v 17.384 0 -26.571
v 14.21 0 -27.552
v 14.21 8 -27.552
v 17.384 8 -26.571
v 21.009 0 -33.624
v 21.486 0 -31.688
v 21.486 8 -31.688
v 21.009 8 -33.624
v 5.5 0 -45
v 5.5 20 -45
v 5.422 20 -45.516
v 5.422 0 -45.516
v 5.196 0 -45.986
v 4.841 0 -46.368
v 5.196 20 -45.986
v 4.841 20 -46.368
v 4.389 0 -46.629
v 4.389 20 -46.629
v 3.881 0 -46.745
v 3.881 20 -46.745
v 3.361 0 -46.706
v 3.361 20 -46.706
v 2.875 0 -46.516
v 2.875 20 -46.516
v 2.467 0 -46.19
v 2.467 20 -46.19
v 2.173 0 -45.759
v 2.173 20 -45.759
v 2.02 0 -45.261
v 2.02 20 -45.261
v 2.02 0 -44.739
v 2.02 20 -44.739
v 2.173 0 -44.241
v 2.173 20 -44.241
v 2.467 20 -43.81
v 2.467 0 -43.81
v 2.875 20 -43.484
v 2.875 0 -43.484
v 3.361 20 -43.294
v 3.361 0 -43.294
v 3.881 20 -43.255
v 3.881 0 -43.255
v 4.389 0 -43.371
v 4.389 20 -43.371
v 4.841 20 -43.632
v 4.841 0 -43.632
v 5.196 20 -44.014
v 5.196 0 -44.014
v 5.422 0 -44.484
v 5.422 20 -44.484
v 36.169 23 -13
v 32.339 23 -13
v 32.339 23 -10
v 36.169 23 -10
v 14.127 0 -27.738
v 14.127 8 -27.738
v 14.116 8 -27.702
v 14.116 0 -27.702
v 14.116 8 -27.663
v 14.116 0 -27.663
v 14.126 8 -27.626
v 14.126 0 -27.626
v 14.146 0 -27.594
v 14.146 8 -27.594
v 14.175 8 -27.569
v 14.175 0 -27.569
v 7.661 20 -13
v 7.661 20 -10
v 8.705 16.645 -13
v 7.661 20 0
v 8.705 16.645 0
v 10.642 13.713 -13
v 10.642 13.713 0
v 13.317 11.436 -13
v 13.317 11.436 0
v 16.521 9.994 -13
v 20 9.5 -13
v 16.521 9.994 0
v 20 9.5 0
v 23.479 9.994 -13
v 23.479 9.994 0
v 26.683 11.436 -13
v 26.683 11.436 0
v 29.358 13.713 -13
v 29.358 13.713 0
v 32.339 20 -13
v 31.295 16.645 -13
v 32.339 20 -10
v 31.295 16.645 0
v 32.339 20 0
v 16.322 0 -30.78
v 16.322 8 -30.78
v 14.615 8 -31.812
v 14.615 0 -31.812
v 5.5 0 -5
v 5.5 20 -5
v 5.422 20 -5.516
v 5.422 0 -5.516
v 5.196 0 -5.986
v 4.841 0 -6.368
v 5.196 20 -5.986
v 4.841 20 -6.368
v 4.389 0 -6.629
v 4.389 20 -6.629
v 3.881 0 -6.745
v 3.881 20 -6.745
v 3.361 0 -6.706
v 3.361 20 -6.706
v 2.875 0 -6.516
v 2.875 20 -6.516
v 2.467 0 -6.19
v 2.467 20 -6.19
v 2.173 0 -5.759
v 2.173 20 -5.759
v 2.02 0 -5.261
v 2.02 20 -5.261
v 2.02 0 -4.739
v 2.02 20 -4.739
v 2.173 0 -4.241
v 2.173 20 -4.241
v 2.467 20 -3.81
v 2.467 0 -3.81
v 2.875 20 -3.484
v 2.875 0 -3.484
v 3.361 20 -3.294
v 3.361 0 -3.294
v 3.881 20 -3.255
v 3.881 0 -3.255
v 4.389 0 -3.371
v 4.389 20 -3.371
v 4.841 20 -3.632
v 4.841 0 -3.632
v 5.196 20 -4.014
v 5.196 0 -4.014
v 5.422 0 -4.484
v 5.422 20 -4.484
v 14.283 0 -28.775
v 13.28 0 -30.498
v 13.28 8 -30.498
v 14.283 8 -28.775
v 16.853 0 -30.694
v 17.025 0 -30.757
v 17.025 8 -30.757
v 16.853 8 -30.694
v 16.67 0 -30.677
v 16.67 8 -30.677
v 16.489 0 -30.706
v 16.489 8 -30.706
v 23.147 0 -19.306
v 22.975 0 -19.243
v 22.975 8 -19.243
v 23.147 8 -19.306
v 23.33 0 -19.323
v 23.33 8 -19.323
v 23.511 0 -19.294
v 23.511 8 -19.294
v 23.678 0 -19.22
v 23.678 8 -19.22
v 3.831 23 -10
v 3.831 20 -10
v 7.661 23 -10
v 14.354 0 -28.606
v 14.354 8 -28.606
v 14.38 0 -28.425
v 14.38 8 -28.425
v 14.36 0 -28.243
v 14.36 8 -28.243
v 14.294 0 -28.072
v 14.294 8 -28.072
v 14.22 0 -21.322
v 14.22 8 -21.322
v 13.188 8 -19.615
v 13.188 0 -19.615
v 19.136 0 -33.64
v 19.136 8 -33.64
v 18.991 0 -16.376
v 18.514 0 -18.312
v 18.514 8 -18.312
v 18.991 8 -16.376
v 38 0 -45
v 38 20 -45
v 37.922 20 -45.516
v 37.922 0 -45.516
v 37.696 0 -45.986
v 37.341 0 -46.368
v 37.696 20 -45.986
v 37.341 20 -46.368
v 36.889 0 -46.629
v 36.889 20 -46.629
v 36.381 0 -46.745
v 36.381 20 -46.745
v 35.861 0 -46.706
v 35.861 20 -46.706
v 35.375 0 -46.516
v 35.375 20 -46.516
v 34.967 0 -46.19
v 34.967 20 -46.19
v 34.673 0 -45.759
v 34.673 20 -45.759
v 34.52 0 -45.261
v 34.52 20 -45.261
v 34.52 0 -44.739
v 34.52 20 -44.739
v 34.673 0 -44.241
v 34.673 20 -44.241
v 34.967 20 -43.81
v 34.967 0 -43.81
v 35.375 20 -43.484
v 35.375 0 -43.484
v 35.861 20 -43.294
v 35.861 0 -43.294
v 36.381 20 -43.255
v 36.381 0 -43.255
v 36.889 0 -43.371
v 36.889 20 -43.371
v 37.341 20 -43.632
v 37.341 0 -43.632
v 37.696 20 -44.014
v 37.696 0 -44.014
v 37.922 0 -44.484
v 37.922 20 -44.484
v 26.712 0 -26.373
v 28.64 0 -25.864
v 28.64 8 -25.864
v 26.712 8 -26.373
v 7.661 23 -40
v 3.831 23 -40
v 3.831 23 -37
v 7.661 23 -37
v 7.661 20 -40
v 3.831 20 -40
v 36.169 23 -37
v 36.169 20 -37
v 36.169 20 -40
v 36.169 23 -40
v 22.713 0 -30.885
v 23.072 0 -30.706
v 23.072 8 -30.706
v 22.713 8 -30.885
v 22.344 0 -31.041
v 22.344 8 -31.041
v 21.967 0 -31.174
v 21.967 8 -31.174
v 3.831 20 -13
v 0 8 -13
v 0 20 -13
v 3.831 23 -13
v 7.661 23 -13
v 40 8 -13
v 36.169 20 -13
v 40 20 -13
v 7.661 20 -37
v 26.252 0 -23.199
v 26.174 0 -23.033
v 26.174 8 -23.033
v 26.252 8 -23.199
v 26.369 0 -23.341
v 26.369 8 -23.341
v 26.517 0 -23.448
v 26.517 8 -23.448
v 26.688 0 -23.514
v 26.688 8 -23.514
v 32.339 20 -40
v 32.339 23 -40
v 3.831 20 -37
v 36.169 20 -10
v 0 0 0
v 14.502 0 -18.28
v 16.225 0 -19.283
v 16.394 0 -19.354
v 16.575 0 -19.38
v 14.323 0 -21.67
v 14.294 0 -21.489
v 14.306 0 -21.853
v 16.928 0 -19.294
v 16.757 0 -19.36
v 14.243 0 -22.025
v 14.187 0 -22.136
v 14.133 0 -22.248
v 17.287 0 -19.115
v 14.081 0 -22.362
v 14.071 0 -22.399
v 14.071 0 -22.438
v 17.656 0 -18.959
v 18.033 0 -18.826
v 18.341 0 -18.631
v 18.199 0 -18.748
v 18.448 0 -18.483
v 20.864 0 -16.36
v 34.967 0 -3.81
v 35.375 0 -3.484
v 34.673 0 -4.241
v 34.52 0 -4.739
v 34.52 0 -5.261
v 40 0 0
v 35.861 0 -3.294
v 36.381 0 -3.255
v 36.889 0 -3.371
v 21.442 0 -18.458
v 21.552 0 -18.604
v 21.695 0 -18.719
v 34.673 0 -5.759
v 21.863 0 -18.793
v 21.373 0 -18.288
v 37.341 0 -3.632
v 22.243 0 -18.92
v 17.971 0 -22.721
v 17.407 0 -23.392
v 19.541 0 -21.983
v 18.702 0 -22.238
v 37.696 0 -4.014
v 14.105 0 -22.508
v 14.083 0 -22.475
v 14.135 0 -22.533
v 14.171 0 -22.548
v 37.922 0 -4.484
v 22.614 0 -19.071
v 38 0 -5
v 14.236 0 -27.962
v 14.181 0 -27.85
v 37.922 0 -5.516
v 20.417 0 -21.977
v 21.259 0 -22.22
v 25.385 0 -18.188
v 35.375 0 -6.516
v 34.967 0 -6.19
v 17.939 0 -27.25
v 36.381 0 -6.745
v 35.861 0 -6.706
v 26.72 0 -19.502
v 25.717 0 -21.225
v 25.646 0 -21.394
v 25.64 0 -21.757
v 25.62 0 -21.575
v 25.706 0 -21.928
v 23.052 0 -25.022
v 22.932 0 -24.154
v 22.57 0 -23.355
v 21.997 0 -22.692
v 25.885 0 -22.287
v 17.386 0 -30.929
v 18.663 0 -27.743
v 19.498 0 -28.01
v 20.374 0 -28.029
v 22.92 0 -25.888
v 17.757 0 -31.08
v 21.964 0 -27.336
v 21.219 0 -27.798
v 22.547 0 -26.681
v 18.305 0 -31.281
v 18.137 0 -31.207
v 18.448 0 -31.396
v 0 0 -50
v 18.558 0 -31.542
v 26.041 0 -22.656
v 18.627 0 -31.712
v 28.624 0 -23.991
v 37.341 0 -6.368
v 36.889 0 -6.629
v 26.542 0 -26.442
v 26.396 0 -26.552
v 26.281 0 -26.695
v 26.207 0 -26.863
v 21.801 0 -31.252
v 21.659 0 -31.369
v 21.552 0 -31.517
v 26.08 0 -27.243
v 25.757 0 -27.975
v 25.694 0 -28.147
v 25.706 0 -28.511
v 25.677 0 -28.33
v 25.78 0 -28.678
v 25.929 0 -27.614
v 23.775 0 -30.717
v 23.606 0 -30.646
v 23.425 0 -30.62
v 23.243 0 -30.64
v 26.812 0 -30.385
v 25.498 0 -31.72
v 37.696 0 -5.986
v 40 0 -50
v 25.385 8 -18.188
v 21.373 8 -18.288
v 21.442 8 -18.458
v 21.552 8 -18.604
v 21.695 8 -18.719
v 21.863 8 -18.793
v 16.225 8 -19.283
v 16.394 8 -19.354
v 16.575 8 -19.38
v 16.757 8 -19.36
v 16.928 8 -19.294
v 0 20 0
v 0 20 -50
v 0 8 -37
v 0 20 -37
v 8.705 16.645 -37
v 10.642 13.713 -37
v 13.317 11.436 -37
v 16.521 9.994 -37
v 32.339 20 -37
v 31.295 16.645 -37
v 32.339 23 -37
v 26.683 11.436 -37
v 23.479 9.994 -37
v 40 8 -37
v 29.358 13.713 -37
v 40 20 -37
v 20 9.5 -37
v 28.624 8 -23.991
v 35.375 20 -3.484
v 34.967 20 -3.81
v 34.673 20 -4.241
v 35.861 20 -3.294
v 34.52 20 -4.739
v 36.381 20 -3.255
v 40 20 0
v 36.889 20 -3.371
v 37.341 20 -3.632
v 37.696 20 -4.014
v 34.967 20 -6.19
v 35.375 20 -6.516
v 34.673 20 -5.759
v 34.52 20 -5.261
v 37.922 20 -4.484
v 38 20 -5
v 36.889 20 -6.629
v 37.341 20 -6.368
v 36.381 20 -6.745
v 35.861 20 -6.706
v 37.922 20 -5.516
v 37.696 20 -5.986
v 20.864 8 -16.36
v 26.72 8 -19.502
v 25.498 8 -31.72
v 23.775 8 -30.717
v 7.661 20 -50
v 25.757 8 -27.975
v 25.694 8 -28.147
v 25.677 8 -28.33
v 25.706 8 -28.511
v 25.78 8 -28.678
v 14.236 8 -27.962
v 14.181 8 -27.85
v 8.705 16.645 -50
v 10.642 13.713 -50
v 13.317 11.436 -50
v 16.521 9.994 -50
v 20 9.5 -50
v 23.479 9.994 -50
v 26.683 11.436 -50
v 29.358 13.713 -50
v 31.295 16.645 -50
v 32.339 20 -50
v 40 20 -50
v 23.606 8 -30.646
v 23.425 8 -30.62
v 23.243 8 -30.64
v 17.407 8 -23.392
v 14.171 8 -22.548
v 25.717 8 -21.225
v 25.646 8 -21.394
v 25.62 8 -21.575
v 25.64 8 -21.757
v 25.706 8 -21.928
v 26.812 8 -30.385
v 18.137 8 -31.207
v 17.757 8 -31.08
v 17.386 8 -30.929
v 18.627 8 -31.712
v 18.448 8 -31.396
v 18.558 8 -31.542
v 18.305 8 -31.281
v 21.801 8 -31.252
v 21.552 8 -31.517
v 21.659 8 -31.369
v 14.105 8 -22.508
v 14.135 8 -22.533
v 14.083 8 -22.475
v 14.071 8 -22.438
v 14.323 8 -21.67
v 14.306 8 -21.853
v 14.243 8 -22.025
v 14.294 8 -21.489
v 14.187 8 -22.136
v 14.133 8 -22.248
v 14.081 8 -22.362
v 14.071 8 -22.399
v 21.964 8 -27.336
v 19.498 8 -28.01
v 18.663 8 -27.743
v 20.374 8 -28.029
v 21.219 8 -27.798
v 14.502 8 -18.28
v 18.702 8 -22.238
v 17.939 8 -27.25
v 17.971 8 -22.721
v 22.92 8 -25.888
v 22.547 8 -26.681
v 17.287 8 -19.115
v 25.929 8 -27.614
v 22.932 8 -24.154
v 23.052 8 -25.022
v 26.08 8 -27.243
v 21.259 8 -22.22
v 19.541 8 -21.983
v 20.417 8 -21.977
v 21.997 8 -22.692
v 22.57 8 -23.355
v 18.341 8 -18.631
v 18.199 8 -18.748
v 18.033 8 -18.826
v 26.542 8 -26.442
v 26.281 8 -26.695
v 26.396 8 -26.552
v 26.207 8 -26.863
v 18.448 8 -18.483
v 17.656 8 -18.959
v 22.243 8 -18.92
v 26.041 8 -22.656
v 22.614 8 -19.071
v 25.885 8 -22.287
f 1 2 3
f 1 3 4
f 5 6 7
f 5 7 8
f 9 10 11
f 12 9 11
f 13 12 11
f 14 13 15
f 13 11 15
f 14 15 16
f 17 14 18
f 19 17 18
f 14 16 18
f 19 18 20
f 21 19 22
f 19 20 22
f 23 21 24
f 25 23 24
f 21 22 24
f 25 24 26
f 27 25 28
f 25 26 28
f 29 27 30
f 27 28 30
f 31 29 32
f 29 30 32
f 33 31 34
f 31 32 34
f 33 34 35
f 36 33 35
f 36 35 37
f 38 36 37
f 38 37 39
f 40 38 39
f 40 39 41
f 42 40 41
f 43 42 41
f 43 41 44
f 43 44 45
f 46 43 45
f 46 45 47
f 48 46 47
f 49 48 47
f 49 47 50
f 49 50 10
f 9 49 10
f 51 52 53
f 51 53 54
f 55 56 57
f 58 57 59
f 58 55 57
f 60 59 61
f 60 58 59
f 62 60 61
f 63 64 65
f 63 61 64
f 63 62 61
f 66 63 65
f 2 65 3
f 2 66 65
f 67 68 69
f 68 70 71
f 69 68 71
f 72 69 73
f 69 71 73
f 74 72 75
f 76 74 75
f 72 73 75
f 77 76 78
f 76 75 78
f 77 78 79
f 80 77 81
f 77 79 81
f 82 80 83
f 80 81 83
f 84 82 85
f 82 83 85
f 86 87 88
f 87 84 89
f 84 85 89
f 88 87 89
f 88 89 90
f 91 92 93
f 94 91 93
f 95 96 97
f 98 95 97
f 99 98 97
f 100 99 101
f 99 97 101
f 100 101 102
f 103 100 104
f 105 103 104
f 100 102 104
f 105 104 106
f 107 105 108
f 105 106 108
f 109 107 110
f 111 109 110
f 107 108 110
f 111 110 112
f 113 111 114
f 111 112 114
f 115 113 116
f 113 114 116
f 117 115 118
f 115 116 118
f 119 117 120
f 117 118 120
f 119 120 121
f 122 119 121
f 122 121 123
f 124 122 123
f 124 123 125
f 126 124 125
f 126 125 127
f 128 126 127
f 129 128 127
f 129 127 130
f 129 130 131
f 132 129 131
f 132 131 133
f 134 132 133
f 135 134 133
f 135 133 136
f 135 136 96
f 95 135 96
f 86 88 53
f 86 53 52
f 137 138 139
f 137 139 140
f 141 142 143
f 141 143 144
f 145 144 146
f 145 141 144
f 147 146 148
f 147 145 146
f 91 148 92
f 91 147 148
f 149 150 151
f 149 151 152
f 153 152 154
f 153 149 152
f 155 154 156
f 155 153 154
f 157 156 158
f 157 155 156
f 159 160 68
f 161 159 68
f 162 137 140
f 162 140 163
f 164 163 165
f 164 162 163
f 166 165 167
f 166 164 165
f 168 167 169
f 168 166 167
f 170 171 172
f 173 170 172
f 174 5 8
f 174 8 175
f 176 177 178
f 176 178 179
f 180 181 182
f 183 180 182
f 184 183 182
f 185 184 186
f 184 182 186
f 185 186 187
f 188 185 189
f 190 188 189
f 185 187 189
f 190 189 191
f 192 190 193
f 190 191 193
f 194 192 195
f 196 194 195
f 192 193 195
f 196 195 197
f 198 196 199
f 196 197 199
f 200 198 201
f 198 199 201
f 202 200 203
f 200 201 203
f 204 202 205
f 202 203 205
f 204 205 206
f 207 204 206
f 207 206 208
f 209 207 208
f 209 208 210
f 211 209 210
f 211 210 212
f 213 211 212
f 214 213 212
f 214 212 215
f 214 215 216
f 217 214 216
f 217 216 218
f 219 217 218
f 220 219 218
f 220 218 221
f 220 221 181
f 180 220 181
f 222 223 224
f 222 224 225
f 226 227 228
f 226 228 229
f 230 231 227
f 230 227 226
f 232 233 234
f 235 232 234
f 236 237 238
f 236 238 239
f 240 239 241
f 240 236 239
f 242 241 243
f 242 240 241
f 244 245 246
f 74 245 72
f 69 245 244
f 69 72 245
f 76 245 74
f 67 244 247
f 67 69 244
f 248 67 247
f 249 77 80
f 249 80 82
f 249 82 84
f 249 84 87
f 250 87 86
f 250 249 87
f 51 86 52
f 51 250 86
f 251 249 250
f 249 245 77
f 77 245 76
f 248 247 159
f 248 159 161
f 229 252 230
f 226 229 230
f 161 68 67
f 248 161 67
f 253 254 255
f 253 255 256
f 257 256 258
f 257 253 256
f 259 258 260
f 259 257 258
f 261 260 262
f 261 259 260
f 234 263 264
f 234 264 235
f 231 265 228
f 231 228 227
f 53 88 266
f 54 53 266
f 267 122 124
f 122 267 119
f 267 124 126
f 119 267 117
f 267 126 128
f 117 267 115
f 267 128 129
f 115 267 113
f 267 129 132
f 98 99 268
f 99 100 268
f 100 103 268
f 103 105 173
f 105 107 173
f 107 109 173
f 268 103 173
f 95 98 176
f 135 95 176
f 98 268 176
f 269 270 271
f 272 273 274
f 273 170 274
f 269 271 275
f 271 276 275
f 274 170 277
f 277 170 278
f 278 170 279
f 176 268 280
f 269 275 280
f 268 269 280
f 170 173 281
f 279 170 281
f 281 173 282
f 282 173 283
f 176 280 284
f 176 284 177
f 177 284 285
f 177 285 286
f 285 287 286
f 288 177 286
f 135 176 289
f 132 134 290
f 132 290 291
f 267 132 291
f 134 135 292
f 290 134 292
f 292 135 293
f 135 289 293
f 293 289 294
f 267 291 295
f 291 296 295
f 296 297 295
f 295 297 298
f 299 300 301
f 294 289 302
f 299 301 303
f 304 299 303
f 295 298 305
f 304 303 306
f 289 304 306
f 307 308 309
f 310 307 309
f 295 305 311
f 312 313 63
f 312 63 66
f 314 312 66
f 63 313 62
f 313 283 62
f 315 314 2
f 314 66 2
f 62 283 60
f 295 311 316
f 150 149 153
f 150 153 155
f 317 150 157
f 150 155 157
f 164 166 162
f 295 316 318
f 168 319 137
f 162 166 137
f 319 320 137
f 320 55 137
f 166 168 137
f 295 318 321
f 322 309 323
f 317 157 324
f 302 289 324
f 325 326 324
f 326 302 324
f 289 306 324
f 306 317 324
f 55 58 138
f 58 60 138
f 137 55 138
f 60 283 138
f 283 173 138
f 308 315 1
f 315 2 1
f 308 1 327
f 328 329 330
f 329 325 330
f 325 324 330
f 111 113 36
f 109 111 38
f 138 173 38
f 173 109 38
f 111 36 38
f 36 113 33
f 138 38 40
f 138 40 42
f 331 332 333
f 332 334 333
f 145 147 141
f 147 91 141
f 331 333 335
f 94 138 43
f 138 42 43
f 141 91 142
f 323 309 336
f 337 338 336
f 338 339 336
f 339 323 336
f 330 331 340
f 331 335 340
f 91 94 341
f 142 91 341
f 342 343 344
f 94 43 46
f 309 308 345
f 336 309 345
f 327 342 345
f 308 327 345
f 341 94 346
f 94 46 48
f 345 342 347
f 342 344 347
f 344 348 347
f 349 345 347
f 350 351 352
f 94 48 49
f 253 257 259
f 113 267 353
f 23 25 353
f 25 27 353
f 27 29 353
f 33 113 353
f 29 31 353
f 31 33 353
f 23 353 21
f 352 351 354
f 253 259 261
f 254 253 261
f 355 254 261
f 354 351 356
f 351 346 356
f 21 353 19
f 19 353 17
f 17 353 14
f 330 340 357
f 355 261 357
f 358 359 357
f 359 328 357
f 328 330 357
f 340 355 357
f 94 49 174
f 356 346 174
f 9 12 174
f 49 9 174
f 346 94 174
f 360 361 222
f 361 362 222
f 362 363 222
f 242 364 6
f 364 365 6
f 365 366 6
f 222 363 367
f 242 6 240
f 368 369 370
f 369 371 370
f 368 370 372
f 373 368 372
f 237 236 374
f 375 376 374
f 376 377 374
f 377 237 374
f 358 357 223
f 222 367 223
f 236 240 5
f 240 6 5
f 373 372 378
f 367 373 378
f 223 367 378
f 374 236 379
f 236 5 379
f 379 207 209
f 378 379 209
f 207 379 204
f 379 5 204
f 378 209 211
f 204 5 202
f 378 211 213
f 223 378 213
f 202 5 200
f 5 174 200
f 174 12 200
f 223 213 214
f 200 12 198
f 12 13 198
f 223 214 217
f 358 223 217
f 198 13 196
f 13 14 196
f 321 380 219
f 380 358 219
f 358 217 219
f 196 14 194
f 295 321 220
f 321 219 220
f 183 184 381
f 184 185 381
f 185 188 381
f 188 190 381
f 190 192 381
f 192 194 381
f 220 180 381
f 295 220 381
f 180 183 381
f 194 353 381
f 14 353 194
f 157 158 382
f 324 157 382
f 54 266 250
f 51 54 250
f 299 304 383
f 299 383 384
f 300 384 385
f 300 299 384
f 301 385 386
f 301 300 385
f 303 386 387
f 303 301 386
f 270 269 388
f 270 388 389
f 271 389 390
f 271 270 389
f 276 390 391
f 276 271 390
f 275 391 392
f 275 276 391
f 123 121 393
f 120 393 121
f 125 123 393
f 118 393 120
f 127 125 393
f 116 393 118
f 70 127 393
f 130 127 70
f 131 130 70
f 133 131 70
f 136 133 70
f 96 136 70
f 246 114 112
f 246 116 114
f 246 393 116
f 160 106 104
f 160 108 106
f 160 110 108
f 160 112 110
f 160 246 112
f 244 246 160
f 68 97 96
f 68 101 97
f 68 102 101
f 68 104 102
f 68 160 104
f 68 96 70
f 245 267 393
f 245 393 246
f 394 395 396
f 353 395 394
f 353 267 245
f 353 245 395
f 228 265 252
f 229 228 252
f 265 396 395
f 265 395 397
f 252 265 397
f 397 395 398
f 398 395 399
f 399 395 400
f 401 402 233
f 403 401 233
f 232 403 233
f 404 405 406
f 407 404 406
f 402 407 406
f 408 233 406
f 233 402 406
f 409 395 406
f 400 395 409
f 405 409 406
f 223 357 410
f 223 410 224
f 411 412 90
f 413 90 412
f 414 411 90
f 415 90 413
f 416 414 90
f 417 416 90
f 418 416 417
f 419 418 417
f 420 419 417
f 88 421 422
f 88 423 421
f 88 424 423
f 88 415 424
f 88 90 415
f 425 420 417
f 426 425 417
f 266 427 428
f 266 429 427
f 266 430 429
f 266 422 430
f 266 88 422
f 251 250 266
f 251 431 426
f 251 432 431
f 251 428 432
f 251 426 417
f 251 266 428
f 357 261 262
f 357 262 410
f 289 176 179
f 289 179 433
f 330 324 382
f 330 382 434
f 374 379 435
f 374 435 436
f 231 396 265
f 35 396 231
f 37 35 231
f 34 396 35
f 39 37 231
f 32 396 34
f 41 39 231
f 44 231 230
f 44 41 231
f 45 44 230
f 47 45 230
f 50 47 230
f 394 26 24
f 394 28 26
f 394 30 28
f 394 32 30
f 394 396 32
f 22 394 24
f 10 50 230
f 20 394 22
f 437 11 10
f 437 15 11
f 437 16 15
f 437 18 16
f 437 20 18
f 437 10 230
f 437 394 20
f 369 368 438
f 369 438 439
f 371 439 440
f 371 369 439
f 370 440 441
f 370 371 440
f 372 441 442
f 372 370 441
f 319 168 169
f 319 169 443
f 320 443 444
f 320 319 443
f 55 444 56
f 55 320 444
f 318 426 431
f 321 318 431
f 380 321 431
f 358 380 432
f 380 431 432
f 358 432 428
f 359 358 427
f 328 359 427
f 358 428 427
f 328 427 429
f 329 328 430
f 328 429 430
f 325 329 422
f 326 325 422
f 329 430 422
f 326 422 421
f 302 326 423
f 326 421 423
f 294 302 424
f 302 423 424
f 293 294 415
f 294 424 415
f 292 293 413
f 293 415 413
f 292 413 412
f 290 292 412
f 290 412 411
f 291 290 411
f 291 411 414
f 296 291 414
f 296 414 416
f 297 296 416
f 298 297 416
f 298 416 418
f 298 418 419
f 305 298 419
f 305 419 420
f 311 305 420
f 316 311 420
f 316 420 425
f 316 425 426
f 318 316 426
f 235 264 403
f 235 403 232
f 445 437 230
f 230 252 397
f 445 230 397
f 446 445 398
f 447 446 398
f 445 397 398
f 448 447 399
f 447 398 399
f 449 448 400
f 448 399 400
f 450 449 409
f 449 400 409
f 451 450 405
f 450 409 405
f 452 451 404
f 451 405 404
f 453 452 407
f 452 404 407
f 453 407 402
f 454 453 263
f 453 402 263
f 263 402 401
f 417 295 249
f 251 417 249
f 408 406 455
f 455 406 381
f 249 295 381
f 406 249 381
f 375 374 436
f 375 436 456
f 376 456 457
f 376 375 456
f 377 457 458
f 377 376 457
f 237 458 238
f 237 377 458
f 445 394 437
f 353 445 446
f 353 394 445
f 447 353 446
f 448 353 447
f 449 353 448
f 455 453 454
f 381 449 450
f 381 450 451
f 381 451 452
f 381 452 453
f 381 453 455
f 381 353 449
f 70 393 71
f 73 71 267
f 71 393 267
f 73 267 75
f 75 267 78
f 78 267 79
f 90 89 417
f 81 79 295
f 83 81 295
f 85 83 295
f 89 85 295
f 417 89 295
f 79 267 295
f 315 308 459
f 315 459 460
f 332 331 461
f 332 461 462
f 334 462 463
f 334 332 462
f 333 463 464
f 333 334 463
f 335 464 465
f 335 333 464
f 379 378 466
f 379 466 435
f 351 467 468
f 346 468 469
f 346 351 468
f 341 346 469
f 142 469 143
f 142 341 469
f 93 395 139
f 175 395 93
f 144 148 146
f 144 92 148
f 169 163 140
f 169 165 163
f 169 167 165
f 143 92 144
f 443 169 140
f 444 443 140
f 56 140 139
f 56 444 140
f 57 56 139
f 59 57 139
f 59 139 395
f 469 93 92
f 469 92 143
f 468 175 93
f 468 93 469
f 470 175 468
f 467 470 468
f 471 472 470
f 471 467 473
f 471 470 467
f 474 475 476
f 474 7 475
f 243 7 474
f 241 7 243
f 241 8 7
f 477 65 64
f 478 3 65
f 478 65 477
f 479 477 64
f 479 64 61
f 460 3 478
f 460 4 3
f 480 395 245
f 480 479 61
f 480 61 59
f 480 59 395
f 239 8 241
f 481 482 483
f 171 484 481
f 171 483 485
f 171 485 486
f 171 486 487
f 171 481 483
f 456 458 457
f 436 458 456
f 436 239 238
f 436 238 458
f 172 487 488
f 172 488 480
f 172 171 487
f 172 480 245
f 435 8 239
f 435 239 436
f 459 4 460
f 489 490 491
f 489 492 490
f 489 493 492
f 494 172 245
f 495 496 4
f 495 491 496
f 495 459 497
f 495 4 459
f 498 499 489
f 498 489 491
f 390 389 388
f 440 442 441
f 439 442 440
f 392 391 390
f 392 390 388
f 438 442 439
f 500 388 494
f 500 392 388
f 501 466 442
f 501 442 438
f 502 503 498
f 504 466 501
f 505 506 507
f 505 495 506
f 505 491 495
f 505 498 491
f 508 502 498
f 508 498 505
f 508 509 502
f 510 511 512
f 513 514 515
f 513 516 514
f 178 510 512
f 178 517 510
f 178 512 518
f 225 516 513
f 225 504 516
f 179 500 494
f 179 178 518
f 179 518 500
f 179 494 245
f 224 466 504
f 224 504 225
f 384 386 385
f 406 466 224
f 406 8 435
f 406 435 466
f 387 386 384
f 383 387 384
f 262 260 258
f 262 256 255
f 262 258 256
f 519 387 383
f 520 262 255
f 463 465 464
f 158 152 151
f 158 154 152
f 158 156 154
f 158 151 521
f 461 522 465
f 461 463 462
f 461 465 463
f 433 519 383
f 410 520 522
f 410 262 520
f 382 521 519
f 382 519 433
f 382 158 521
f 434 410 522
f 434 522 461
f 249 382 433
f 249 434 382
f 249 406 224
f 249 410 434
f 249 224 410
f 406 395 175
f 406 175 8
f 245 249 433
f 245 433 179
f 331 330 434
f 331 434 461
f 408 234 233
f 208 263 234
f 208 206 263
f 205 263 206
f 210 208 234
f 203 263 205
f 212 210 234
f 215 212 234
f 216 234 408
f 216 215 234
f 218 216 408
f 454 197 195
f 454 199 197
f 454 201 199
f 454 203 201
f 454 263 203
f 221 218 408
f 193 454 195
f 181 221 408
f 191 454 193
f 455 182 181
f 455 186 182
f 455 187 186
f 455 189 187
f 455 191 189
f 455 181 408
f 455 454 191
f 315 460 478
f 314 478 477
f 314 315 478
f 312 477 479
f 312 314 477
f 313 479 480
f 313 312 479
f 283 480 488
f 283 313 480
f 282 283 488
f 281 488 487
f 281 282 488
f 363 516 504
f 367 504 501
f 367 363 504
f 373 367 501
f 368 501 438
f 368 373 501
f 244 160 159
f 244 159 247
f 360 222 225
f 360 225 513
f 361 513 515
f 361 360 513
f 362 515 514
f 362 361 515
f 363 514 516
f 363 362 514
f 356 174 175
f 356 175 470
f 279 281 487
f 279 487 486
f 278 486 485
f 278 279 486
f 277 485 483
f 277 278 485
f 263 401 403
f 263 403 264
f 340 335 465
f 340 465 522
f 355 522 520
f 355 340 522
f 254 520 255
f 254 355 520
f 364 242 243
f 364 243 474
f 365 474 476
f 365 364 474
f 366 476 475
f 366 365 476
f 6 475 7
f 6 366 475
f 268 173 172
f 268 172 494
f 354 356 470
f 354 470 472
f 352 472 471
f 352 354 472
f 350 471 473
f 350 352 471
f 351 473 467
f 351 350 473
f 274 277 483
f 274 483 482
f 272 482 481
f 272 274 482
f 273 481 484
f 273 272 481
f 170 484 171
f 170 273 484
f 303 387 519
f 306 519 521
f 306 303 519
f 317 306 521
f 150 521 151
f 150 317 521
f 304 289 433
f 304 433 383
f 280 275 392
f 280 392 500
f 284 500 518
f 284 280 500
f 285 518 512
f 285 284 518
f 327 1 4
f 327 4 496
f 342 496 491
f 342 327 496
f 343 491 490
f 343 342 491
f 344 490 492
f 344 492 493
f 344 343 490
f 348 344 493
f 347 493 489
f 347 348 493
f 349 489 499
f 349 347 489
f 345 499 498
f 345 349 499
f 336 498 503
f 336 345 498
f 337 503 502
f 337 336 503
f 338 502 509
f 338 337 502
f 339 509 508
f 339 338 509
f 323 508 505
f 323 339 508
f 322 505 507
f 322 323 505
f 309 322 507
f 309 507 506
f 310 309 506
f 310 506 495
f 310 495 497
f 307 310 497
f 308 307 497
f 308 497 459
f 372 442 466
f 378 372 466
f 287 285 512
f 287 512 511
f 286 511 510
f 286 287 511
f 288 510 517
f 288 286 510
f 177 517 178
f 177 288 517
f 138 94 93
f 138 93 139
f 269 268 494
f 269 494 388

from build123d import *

# Parameters (mm, degrees)
CROQUIS1_W              = 40
CROQUIS1_H              = 50
SALIENTE_EXTRUIR1_DEPTH = 20
CROQUIS2_R              = 12.5
CORTAR_EXTRUIR1_DEPTH   = 51
CROQUIS3_R              = 1.75
CORTAR_EXTRUIR2_DEPTH   = 21
CORTAR_EXTRUIR3_DEPTH   = 41
CROQUIS5_W              = 3.830518661
CROQUIS5_H              = 3
SALIENTE_EXTRUIR3_DEPTH = 3
CORTAR_EXTRUIR5_DEPTH   = 24


with BuildPart() as part:
    # Croquis1 → Saliente-Extruir1 (new body)
    with BuildSketch(Plane(origin=(0, 0, 0), x_dir=(1, 0, 0), z_dir=(0, 1, 0))):
        with Locations((20, 25)):
            Rectangle(CROQUIS1_W, CROQUIS1_H)
    extrude(amount=SALIENTE_EXTRUIR1_DEPTH)

    # Croquis2 → Cortar-Extruir1 (cut, through all)
    with BuildSketch(Plane.XY):
        with Locations((20, 22)):
            Circle(CROQUIS2_R)
    extrude(amount=-CORTAR_EXTRUIR1_DEPTH, mode=Mode.SUBTRACT)

    # Croquis3 → Cortar-Extruir2 (cut, through all)
    with BuildSketch(Plane(origin=(0, 20, 0), x_dir=(1, 0, 0), z_dir=(0, 1, 0))):
        with Locations((3.75, 45)):
            Circle(CROQUIS3_R)
        with Locations((36.25, 45)):
            Circle(CROQUIS3_R)
        with Locations((36.25, 5)):
            Circle(CROQUIS3_R)
        with Locations((3.75, 5)):
            Circle(CROQUIS3_R)
    extrude(amount=-CORTAR_EXTRUIR2_DEPTH, mode=Mode.SUBTRACT)

    # Croquis4 → Cortar-Extruir3 (cut, through all)
    with BuildSketch(Plane(origin=(40, 0, 0), x_dir=(0, 0, -1), z_dir=(1, 0, 0))):
        Polygon((25, 20), (37, 20), (37, 8), (13, 8), (13, 20), align=None)
    extrude(amount=-CORTAR_EXTRUIR3_DEPTH, mode=Mode.SUBTRACT)

    # Croquis5 → Saliente-Extruir3 (add)
    with BuildSketch(Plane(origin=(0, 20, 0), x_dir=(1, 0, 0), z_dir=(0, 1, 0))):
        with Locations((5.745777991, 38.5)):
            Rectangle(CROQUIS5_W, CROQUIS5_H)
        with Locations((34.25422201, 38.5)):
            Rectangle(CROQUIS5_W, CROQUIS5_H)
        with Locations((34.25422201, 11.5)):
            Rectangle(CROQUIS5_W, CROQUIS5_H)
        with Locations((5.745777991, 11.5)):
            Rectangle(CROQUIS5_W, CROQUIS5_H)
    extrude(amount=SALIENTE_EXTRUIR3_DEPTH)

    # Croquis6 → Cortar-Extruir5 (cut, through all)
    with BuildSketch(Plane.XZ):
        with BuildLine():
            Line((13.188139939, -19.615331161), (14.501537669, -18.279657152))
            Line((14.501537669, -18.279657152), (16.224863288, -19.28260268))
            ThreePointArc((16.224863288, -19.28260268), (16.575067996, -19.380217097), (16.928320792, -19.294284721))
            ThreePointArc((16.928320792, -19.294284721), (17.469957789, -19.034324312), (18.033343063, -18.825644933))
            ThreePointArc((18.033343063, -18.825644933), (18.340671144, -18.631425053), (18.513928995, -18.31181024))
            Line((18.513928995, -18.31181024), (18.990823409, -16.375751708))
            Line((18.990823409, -16.375751708), (20.864, -16.36))
            Line((20.864, -16.36), (21.373385647, -18.287764816))
            ThreePointArc((21.373385647, -18.287764816), (21.551993955, -18.604420755), (21.862544768, -18.793444837))
            ThreePointArc((21.862544768, -18.793444837), (22.429359729, -18.992620263), (22.975291881, -19.243435206))
            ThreePointArc((22.975291881, -19.243435206), (23.329939845, -19.323414782), (23.678453448, -19.219924782))
            Line((23.678453448, -19.219924782), (25.384668839, -18.188139939))
            Line((25.384668839, -18.188139939), (26.720342848, -19.501537669))
            Line((26.720342848, -19.501537669), (25.71739732, -21.224863288))
            ThreePointArc((25.71739732, -21.224863288), (25.619782903, -21.575067996), (25.705715279, -21.928320792))
            ThreePointArc((25.705715279, -21.928320792), (25.965675688, -22.469957789), (26.174355067, -23.033343063))
            ThreePointArc((26.174355067, -23.033343063), (26.368574947, -23.340671144), (26.68818976, -23.513928995))
            Line((26.68818976, -23.513928995), (28.624248292, -23.990823409))
            Line((28.624248292, -23.990823409), (28.64, -25.864))
            Line((28.64, -25.864), (26.712235184, -26.373385647))
            ThreePointArc((26.712235184, -26.373385647), (26.395579245, -26.551993955), (26.206555163, -26.862544768))
            ThreePointArc((26.206555163, -26.862544768), (26.007379737, -27.429359729), (25.756564794, -27.975291881))
            ThreePointArc((25.756564794, -27.975291881), (25.676585218, -28.329939845), (25.780075218, -28.678453448))
            Line((25.780075218, -28.678453448), (26.811860061, -30.384668839))
            Line((26.811860061, -30.384668839), (25.498462331, -31.720342848))
            Line((25.498462331, -31.720342848), (23.775136712, -30.71739732))
            ThreePointArc((23.775136712, -30.71739732), (23.424932004, -30.619782903), (23.071679208, -30.705715279))
            ThreePointArc((23.071679208, -30.705715279), (22.530042211, -30.965675688), (21.966656937, -31.174355067))
            ThreePointArc((21.966656937, -31.174355067), (21.659328856, -31.368574947), (21.486071005, -31.68818976))
            Line((21.486071005, -31.68818976), (21.009176591, -33.624248292))
            Line((21.009176591, -33.624248292), (19.136, -33.64))
            Line((19.136, -33.64), (18.626614353, -31.712235184))
            ThreePointArc((18.626614353, -31.712235184), (18.448006045, -31.395579245), (18.137455232, -31.206555163))
            ThreePointArc((18.137455232, -31.206555163), (17.570640271, -31.007379737), (17.024708119, -30.756564794))
            ThreePointArc((17.024708119, -30.756564794), (16.670060155, -30.676585218), (16.321546552, -30.780075218))
            Line((16.321546552, -30.780075218), (14.615331161, -31.811860061))
            Line((14.615331161, -31.811860061), (13.279657152, -30.498462331))
            Line((13.279657152, -30.498462331), (14.28260268, -28.775136712))
            ThreePointArc((14.28260268, -28.775136712), (14.380217097, -28.424932004), (14.294284721, -28.071679208))
            ThreePointArc((14.294284721, -28.071679208), (14.208247472, -27.906200724), (14.127008205, -27.738314697))
            ThreePointArc((14.127008205, -27.738314697), (14.125953752, -27.626452127), (14.209575503, -27.552143653))
            Line((14.209575503, -27.552143653), (17.384042323, -26.571445385))
            ThreePointArc((17.384042323, -26.571445385), (23.05159058, -25.021681648), (17.406635637, -23.391542216))
            Line((17.406635637, -23.391542216), (14.170602247, -22.54767412))
            ThreePointArc((14.170602247, -22.54767412), (14.082937198, -22.475491969), (14.08129489, -22.361945826))
            ThreePointArc((14.08129489, -22.361945826), (14.159930296, -22.19215637), (14.243435206, -22.024708119))
            ThreePointArc((14.243435206, -22.024708119), (14.323414782, -21.670060155), (14.219924782, -21.321546552))
            Line((14.219924782, -21.321546552), (13.188139939, -19.615331161))
        make_face()
    extrude(amount=-CORTAR_EXTRUIR5_DEPTH, mode=Mode.SUBTRACT)


solid = part.part
